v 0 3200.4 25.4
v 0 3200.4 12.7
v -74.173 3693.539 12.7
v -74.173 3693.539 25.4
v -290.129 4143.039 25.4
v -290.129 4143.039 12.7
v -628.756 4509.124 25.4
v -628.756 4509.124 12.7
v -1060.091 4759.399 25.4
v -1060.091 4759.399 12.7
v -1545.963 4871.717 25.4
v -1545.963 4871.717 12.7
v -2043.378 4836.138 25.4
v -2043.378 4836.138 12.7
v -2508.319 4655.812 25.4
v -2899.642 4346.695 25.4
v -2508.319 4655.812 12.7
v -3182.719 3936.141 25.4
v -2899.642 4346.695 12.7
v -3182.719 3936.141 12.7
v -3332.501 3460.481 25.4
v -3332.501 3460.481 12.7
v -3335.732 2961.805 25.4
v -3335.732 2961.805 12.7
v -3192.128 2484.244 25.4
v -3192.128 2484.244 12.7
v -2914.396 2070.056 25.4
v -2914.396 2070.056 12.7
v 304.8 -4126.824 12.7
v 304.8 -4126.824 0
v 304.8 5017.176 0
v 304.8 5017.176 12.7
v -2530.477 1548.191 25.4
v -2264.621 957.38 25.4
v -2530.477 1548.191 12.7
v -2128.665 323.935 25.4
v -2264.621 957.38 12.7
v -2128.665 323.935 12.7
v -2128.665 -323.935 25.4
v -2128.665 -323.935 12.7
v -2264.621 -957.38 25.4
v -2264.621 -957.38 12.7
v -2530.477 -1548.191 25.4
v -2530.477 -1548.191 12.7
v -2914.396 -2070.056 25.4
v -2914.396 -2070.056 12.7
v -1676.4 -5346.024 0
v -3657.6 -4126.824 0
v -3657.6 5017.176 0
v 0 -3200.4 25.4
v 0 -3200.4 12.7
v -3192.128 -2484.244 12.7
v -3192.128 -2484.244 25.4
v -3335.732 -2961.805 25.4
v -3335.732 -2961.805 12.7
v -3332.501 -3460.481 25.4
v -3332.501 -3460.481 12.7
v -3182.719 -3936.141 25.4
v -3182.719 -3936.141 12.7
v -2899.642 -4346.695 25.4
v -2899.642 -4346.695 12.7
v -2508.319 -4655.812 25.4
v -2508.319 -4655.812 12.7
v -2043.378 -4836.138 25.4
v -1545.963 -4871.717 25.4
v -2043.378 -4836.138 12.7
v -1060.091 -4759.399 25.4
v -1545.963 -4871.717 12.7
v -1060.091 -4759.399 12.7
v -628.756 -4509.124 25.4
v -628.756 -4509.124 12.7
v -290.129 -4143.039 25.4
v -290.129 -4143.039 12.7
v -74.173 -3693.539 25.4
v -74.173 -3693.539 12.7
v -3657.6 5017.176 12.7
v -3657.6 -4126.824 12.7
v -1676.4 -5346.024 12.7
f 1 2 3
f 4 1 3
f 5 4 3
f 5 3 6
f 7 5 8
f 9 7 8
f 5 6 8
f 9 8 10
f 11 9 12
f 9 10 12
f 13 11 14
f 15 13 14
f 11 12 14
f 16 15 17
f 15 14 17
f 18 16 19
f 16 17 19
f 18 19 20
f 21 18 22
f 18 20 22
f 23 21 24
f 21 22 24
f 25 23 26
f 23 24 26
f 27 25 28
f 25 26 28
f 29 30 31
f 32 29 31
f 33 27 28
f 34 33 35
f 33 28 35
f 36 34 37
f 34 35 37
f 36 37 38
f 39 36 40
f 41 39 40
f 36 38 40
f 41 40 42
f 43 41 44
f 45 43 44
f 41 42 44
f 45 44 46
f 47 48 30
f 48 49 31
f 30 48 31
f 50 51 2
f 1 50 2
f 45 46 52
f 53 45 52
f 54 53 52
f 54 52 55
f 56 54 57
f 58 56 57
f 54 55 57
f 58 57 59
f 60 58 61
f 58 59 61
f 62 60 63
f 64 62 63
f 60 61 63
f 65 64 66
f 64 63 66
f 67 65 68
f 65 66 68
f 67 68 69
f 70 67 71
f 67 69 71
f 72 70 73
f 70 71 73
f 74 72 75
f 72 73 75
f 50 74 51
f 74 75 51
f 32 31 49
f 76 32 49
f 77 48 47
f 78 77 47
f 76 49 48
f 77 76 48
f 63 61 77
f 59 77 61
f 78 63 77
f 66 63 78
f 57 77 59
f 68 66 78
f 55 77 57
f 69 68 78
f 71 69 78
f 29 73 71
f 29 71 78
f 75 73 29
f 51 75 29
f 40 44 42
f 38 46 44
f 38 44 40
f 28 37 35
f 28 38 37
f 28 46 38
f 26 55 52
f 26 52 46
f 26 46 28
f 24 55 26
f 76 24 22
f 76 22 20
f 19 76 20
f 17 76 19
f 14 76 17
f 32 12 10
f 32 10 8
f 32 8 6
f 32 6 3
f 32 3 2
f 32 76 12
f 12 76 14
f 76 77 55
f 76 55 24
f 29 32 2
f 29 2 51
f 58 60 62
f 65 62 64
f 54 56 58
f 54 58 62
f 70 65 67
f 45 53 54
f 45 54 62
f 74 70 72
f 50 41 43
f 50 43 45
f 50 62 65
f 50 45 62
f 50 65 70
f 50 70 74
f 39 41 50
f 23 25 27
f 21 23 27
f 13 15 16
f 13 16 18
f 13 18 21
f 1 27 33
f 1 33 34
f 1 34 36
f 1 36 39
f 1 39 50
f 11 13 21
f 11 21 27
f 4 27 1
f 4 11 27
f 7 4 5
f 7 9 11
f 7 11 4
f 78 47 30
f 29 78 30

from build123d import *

# Parameters (mm, degrees)
F2_DEPTH = 25.4
F3_DEPTH = 12.7


with BuildPart() as f2:
    # F0 (on Top) → F2 (new body)
    with BuildSketch(Plane.XY):
        with BuildLine():
            ThreePointArc((-2914.395653, -2070.055608), (-2282.591149, -4763.36037), (0, -3200.4))
            Line((0, -3200.4), (0, 3200.4))
            ThreePointArc((0, 3200.4), (-2282.591149, 4763.36037), (-2914.395653, 2070.055608))
            ThreePointArc((-2914.395653, 2070.055608), (-2111.5274, 0), (-2914.395653, -2070.055608))
        make_face()
    extrude(amount=F2_DEPTH)

    # F1 (on Top) → F3 (join)
    with BuildSketch(Plane.XY):
        Polygon((304.8, 5017.175964), (-3657.6, 5017.175964), (-3657.6, -4126.824036), (-1676.4, -5346.024036), (304.8, -4126.824036), align=None)
    extrude(amount=F3_DEPTH)


solid = f2.part
